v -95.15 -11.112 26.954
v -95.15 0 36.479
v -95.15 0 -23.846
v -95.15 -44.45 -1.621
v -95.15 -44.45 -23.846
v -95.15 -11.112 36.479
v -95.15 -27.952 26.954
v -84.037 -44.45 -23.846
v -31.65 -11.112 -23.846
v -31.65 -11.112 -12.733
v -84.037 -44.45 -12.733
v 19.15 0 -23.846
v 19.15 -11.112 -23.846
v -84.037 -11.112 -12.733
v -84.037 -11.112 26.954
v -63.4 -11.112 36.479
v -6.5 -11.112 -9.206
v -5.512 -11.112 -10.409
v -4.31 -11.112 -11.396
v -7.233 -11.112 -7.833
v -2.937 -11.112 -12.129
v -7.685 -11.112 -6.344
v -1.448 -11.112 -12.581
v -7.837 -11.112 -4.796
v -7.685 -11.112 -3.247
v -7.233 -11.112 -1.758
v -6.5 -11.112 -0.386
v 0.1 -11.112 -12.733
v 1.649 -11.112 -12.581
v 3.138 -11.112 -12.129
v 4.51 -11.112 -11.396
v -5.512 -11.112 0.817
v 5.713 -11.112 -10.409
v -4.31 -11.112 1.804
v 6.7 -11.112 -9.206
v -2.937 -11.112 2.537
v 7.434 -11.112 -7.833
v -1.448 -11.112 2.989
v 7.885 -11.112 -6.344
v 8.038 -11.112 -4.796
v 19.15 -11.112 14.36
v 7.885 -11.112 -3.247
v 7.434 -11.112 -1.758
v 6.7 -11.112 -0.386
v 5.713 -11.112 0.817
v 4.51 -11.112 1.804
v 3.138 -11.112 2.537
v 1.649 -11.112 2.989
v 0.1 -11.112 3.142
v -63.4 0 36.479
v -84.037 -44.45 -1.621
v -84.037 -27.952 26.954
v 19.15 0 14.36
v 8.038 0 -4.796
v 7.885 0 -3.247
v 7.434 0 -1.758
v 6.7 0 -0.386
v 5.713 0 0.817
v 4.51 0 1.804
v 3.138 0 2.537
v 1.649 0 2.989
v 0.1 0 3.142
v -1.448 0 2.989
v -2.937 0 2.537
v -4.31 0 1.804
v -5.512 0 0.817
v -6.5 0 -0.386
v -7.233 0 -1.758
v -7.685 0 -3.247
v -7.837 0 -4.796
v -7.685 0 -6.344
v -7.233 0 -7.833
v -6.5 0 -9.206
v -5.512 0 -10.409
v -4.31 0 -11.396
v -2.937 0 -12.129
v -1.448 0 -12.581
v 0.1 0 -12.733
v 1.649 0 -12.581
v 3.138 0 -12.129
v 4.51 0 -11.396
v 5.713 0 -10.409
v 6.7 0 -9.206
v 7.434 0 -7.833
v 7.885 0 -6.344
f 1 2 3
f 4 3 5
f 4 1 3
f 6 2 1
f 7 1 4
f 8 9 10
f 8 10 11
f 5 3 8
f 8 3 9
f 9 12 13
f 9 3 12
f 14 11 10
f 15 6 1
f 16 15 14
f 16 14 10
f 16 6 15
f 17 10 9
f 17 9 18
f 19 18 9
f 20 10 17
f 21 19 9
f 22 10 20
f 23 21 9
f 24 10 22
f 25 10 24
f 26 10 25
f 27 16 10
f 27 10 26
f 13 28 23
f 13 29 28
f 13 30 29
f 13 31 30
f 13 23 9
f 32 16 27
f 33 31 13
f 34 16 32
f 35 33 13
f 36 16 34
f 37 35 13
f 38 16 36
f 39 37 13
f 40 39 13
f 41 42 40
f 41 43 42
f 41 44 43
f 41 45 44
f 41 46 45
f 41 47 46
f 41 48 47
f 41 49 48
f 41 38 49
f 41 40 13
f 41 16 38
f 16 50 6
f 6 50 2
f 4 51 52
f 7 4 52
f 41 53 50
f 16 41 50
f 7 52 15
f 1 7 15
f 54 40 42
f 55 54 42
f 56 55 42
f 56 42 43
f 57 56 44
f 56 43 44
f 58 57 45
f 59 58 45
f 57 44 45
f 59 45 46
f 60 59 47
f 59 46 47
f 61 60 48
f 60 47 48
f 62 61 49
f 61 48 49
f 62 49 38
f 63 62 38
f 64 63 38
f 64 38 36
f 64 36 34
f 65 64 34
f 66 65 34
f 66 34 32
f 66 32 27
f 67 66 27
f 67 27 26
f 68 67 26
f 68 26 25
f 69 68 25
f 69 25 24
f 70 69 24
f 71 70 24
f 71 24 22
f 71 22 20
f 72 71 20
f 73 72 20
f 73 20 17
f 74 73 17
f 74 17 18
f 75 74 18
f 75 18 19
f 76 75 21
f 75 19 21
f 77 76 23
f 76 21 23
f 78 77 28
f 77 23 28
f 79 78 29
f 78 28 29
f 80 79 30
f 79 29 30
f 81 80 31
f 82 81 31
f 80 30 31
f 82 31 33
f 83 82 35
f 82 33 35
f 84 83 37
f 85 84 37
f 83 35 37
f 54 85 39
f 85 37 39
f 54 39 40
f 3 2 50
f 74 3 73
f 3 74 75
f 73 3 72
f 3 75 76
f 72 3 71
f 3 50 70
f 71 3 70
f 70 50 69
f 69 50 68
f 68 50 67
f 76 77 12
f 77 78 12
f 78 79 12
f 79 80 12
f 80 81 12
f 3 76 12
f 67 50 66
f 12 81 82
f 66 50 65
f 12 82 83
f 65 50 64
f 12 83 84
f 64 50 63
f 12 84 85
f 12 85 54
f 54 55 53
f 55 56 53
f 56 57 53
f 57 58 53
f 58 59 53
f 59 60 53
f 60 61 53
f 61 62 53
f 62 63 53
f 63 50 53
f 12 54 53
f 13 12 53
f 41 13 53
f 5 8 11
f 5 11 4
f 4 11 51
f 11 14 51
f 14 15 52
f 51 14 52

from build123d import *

# Parameters (mm, degrees)
F1_DEPTH = 11.1125
F2_R     = 7.9375
F3_DEPTH = 25.4
F5_DEPTH = 11.1125
F6_W     = 33.3375
F6_H     = 11.1125
F7_DEPTH = 11.1125


with BuildPart() as f1:
    # F0 (on Front) → F1 (new body)
    with BuildSketch(Plane.XZ):
        Polygon((-63.399741, 36.479078), (-95.149741, 36.479078), (-95.149741, -23.845922), (19.150259, -23.845922), (19.150259, 14.359872), align=None)
    extrude(amount=F1_DEPTH)

    # F2 (on face) → F3 (cut)
    with BuildSketch(Plane.XZ.offset(11.1125)):
        with Locations((0.100259, -4.795922)):
            Circle(F2_R)
    extrude(amount=-F3_DEPTH, mode=Mode.SUBTRACT)

    # F4 (on face) → F5 (join)
    with BuildSketch(Plane(origin=(0, 0, -23.845922), x_dir=(1, 0, 0), z_dir=(0, 0, -1))):
        Polygon((-31.649741, 11.1125), (-84.037241, 44.45), (-84.037241, 11.1125), align=None)
    extrude(amount=-F5_DEPTH)

    # F6 (on face) → F7 (join)
    with BuildSketch(Plane(origin=(-84.037241, 0, 0), x_dir=(0, -1, 0), z_dir=(-1, 0, 0))):
        with Locations((27.78125, -18.289672)):
            Rectangle(F6_W, F6_H)
        Polygon((11.1125, -12.733422), (44.45, -12.733422), (44.45, -1.620922), (27.952216, 26.954078), (11.1125, 26.954078), align=None)
    extrude(amount=F7_DEPTH)


solid = f1.part
